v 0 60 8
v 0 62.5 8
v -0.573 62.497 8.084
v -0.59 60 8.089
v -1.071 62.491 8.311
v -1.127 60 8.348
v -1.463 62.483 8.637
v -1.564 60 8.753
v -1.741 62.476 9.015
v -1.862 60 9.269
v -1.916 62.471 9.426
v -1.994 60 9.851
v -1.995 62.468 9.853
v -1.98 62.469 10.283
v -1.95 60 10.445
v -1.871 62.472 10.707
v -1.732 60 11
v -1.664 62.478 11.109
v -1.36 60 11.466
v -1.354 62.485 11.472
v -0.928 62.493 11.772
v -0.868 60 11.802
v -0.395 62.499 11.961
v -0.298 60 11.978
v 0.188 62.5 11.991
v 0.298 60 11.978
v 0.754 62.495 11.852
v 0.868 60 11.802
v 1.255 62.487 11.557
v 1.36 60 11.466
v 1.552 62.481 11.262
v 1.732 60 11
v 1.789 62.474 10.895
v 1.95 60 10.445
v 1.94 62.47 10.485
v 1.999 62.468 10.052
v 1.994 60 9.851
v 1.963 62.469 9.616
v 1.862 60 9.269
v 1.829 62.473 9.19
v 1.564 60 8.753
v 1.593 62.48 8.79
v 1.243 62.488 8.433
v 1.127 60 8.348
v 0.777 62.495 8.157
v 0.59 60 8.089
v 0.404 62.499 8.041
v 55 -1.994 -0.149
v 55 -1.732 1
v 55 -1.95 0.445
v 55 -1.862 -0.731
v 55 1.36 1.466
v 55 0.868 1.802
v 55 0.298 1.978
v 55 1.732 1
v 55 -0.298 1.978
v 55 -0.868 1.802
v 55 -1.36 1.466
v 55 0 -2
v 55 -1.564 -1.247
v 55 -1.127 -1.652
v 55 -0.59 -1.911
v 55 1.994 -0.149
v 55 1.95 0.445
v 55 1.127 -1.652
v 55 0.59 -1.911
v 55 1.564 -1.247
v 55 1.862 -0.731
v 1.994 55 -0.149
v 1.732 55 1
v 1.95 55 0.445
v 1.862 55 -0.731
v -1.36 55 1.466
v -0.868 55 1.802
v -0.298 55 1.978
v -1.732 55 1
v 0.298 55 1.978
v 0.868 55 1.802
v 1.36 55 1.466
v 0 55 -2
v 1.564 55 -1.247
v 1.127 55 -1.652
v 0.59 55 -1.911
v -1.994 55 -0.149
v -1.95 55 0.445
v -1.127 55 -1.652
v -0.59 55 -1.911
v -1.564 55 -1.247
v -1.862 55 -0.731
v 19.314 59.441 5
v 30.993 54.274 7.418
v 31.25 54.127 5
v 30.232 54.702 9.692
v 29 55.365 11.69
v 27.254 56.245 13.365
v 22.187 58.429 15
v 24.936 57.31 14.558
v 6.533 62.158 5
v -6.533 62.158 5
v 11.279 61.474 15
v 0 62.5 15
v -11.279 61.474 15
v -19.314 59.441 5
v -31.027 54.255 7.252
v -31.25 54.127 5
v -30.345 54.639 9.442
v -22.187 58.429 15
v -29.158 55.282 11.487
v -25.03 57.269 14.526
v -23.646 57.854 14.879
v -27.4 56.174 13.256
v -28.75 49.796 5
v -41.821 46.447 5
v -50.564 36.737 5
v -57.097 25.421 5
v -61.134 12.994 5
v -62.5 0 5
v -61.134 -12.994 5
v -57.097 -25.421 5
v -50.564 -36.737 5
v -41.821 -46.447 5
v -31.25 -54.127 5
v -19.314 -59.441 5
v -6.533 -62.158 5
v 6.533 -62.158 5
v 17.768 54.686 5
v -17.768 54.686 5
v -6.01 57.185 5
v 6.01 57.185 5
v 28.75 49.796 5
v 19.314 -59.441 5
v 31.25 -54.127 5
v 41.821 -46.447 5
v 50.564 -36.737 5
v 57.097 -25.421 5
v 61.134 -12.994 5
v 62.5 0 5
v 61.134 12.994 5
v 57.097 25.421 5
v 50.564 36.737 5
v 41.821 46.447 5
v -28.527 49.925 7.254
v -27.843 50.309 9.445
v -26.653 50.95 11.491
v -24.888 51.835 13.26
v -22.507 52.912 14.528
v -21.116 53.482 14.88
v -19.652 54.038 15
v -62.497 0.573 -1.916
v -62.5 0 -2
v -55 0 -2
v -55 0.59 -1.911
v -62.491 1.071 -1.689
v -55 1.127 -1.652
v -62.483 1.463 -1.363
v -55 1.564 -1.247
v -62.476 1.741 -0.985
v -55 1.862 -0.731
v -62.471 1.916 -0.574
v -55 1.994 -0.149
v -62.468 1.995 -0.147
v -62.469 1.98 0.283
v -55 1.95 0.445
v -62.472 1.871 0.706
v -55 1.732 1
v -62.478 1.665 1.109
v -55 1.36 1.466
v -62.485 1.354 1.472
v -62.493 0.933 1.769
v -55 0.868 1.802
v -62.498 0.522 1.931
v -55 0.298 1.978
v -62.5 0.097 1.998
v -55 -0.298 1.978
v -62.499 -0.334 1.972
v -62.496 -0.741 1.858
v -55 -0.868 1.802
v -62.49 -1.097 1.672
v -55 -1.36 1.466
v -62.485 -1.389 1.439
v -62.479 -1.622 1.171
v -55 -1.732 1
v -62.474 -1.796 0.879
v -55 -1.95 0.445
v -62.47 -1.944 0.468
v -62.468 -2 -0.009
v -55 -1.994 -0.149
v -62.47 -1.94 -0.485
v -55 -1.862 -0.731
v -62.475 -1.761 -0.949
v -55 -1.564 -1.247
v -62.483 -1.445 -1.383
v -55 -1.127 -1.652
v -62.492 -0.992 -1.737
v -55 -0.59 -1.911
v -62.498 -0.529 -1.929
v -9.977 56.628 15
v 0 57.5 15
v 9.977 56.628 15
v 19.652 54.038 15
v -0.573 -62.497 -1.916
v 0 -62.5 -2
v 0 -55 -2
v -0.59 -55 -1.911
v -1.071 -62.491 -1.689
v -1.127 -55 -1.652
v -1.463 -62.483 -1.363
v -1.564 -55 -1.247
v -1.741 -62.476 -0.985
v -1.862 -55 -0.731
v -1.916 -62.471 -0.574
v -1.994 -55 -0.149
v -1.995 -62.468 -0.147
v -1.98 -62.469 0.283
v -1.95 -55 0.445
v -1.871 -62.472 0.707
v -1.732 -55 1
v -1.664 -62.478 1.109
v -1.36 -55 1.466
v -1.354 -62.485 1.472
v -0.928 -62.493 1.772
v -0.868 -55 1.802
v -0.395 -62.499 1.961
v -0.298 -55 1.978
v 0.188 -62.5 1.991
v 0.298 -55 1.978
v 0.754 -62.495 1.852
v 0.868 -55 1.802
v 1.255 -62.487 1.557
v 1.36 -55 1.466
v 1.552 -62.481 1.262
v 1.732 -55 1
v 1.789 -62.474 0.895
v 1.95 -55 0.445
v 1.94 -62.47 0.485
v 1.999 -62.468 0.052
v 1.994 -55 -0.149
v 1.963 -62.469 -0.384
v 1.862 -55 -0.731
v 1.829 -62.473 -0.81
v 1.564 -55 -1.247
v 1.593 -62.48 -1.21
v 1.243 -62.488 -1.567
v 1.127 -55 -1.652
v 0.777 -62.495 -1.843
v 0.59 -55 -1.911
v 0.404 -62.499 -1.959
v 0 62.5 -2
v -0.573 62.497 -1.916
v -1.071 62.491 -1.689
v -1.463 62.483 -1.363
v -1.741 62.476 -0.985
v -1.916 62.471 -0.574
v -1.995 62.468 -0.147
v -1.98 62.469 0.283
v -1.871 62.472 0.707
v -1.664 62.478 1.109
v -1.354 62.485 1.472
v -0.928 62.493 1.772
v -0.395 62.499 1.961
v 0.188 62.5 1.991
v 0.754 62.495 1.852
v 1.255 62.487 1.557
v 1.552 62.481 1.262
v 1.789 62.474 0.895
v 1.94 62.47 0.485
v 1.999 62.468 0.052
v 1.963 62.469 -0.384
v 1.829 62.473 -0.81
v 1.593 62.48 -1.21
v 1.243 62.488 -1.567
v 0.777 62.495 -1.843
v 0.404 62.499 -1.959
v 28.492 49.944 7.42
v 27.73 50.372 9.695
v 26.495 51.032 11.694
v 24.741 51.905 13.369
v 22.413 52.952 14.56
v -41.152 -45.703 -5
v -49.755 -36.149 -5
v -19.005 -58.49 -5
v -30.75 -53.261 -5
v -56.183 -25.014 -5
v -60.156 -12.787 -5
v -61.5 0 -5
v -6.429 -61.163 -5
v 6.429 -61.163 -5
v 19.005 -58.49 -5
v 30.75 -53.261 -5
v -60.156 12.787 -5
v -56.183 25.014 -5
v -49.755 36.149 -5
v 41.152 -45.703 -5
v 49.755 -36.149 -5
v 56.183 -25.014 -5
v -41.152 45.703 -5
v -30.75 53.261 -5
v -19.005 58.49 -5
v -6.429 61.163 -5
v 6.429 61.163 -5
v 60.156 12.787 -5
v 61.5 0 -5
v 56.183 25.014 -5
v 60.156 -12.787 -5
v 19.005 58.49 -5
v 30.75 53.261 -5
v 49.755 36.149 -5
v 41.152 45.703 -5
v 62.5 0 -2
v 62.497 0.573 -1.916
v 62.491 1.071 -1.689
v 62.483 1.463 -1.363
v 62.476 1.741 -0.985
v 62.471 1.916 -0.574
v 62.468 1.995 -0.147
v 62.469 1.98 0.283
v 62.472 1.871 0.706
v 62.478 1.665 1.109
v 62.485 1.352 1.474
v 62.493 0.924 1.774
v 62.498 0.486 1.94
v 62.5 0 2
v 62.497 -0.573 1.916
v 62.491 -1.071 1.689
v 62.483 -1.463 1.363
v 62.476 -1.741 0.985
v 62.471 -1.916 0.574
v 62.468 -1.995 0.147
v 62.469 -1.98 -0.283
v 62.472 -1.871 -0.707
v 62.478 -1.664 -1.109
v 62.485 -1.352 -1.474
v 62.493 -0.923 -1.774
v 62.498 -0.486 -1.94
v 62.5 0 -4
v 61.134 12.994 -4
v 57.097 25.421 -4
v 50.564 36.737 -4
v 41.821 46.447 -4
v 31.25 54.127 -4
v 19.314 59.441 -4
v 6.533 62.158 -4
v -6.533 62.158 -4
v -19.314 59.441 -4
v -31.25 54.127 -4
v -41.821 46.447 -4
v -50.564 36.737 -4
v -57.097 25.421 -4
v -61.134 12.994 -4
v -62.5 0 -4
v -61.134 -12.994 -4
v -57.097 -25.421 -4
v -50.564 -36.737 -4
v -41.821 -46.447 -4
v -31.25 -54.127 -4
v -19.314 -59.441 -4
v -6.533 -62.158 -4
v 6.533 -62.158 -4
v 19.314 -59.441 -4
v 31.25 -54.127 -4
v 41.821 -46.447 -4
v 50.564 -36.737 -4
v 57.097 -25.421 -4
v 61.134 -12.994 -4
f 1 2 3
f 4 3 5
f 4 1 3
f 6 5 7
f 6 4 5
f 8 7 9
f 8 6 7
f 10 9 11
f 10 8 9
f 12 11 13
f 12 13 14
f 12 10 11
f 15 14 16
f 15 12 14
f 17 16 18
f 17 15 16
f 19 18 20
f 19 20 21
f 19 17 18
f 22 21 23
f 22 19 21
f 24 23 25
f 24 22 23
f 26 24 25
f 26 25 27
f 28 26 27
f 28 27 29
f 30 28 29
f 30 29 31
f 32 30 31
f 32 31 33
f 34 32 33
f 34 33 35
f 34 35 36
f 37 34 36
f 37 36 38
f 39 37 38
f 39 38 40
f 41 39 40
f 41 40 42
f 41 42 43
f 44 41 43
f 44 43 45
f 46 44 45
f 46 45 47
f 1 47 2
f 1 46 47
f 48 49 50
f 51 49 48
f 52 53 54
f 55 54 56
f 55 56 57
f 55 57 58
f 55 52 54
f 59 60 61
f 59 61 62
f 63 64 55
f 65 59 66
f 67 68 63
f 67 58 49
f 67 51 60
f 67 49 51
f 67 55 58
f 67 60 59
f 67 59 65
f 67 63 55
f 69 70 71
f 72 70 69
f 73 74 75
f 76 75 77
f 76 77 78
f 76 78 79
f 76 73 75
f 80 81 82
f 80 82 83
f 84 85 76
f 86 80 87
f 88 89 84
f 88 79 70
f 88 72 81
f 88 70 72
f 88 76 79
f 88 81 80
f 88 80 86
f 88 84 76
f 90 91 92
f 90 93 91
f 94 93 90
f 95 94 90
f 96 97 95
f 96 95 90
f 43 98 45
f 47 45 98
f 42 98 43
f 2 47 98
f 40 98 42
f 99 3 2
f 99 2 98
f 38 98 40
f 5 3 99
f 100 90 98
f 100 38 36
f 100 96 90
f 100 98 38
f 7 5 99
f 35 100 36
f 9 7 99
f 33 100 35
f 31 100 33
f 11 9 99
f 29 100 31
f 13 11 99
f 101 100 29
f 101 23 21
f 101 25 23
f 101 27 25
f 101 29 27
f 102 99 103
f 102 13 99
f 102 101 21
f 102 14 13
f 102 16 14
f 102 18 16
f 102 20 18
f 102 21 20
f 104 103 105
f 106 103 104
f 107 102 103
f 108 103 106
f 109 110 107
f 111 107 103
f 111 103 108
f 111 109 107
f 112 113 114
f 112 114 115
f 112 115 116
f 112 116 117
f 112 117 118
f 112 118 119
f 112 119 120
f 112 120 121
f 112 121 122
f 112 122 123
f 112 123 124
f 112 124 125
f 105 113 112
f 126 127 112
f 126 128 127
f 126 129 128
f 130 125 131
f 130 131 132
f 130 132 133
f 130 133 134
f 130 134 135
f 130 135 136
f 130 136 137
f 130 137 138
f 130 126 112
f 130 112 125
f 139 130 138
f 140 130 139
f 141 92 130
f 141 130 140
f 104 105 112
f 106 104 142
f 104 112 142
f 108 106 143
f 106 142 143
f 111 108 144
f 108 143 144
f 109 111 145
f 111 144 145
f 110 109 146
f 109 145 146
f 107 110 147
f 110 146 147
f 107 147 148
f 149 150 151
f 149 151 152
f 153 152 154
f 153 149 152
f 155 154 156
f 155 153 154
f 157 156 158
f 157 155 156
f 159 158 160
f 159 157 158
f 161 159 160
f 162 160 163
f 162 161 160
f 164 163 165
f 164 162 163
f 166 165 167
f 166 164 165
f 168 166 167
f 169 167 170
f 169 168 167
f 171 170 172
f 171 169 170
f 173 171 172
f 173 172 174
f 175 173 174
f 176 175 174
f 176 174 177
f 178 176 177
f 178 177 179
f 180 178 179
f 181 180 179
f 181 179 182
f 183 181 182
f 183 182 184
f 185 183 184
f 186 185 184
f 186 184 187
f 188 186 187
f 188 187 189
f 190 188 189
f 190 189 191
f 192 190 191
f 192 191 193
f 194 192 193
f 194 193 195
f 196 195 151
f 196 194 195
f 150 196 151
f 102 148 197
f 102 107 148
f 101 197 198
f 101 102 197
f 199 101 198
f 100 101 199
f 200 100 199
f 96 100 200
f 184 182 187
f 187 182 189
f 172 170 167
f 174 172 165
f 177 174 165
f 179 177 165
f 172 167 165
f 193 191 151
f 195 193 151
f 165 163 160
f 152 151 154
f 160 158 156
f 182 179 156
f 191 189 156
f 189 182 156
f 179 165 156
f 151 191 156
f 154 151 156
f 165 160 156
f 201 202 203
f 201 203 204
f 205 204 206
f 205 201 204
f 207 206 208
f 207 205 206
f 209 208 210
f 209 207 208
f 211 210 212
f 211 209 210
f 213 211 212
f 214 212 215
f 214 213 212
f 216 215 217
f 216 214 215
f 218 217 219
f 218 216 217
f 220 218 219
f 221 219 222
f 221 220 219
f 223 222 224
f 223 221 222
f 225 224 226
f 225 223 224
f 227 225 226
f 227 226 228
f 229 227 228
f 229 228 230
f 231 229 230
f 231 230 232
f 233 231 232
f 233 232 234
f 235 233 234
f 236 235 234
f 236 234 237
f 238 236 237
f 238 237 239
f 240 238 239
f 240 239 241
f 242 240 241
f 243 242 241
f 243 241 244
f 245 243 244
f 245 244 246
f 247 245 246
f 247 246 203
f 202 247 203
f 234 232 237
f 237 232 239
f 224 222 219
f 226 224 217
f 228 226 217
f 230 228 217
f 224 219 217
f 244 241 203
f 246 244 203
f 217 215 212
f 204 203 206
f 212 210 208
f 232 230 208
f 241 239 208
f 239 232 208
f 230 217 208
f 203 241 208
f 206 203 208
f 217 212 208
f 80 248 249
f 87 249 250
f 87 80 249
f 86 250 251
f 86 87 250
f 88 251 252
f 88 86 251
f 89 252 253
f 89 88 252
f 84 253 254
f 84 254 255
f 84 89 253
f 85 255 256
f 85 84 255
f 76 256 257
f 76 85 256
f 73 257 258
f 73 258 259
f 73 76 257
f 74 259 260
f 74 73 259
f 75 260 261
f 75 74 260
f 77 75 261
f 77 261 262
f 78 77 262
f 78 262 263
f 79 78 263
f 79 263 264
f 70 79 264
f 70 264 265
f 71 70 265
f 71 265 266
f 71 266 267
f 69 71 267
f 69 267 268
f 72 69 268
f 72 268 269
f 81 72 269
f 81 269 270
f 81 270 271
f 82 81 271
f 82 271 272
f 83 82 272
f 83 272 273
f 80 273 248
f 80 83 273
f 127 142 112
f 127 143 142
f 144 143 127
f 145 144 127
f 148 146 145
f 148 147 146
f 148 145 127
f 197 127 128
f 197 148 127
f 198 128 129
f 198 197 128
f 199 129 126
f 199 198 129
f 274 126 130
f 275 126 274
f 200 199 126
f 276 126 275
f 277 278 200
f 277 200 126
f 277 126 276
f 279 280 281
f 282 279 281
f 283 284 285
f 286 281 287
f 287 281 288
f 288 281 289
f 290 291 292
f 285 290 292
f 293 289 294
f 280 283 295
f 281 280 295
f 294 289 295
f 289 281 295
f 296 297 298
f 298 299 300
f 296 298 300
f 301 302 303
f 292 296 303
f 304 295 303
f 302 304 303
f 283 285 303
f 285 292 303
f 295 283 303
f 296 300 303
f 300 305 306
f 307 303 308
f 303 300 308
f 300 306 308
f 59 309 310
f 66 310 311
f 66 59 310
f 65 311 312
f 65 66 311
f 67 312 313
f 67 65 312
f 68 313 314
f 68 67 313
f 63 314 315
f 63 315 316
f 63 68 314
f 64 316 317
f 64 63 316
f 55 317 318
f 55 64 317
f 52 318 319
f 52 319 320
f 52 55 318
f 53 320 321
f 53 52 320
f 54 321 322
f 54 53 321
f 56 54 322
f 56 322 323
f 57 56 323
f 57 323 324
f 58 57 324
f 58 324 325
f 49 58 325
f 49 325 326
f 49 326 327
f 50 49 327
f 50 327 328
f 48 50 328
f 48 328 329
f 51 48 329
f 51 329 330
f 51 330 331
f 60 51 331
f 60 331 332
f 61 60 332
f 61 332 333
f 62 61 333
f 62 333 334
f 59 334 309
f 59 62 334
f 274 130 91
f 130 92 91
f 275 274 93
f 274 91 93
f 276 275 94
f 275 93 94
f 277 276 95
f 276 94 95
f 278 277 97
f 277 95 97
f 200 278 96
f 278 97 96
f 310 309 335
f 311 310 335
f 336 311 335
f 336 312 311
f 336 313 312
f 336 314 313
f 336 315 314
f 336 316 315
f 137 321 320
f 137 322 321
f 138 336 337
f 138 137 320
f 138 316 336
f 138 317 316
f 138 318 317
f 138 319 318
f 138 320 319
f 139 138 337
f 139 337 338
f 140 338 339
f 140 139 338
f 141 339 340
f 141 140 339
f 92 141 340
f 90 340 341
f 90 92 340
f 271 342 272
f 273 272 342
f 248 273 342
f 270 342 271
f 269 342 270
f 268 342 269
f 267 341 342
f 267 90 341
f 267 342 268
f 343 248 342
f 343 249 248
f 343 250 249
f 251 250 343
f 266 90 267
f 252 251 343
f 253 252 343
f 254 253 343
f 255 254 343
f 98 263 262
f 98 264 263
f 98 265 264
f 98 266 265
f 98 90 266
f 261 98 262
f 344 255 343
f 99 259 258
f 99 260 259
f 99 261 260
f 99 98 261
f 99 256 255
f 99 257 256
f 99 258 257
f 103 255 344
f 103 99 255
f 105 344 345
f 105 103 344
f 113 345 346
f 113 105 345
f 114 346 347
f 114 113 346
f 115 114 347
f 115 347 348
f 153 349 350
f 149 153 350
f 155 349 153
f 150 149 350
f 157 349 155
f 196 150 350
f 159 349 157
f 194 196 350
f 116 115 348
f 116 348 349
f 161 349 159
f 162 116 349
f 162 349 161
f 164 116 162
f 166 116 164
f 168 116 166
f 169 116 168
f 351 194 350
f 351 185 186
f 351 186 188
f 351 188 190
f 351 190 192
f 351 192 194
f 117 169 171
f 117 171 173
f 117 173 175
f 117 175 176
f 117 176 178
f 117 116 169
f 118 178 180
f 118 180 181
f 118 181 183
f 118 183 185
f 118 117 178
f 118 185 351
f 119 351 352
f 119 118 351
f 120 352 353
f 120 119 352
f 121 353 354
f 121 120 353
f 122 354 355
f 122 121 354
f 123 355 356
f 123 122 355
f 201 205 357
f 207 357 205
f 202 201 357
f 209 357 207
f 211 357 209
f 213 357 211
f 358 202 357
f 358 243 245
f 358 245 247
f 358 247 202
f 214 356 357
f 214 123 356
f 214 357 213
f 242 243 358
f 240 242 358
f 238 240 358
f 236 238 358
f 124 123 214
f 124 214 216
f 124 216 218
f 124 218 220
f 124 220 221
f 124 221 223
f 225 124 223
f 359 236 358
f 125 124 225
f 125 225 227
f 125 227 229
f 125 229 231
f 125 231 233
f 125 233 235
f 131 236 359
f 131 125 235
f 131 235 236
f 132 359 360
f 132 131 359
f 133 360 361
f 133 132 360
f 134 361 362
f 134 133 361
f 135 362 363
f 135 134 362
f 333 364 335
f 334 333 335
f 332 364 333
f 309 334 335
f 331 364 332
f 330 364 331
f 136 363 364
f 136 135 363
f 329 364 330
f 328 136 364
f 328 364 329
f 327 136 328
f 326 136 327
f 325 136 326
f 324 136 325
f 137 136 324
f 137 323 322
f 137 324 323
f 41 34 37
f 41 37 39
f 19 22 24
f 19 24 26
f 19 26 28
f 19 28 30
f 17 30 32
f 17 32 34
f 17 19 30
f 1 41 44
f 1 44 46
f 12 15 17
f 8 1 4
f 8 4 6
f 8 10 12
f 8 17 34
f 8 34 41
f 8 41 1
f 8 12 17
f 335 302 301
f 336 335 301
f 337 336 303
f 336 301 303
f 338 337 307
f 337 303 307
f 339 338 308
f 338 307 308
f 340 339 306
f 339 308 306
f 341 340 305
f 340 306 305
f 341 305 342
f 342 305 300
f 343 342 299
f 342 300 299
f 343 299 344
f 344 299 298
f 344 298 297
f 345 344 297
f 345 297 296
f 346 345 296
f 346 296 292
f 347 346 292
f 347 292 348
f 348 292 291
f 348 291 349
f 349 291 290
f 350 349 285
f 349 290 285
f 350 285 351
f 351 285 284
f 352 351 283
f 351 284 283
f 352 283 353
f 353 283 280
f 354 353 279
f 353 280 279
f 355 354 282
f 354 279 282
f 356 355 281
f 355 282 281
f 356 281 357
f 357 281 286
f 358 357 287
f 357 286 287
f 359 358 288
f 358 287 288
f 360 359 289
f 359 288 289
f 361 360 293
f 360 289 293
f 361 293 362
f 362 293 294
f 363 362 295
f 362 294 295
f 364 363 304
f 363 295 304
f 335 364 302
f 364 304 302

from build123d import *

# Parameters (mm, degrees)
SKETCH1_R           = 62.5
BOSS_EXTRUDE1_DEPTH = 5
CUT_EXTRUDE1_START  = 55
SKETCH2_R           = 2
CUT_EXTRUDE1_DEPTH  = 10
CUT_EXTRUDE2_START  = -65
SKETCH2_2_R         = 2
CUT_EXTRUDE2_DEPTH  = 10
CUT_EXTRUDE3_START  = 55
SKETCH3_R           = 2
CUT_EXTRUDE3_DEPTH  = 10
CUT_EXTRUDE4_START  = -65
SKETCH3_2_R         = 2
CUT_EXTRUDE4_DEPTH  = 10
BOSS_EXTRUDE2_START = 10
BOSS_EXTRUDE2_DEPTH = 10
FILLET1_R           = 10
CUT_EXTRUDE5_START  = 60
SKETCH6_R           = 2
CUT_EXTRUDE5_DEPTH  = 10
CHAMFER1_SIZE       = 1


with BuildPart() as part:
    # Sketch1 → Boss-Extrude1 (new, symmetric)
    with BuildSketch(Plane.XY):
        Circle(SKETCH1_R)
    extrude(amount=BOSS_EXTRUDE1_DEPTH, both=True)

    # Sketch2 → Cut-Extrude1 (cut)
    with BuildSketch(Plane(origin=(0, 0, 0), x_dir=(1, 0, 0), z_dir=(0, 1, 0)).offset(CUT_EXTRUDE1_START)):
        with Locations(Location((0, 0, 0), (0, 0, 90))):
            Circle(SKETCH2_R)
    extrude(amount=CUT_EXTRUDE1_DEPTH, mode=Mode.SUBTRACT)

    # Sketch2<2> → Cut-Extrude2 (cut)
    with BuildSketch(Plane(origin=(0, 0, 0), x_dir=(1, 0, 0), z_dir=(0, 1, 0)).offset(CUT_EXTRUDE2_START)):
        with Locations(Location((0, 0, 0), (0, 0, 90))):
            Circle(SKETCH2_2_R)
    extrude(amount=CUT_EXTRUDE2_DEPTH, mode=Mode.SUBTRACT)

    # Sketch3 → Cut-Extrude3 (cut)
    with BuildSketch(Plane(origin=(0, 0, 0), x_dir=(0, 0, -1), z_dir=(1, 0, 0)).offset(CUT_EXTRUDE3_START)):
        Circle(SKETCH3_R)
    extrude(amount=CUT_EXTRUDE3_DEPTH, mode=Mode.SUBTRACT)

    # Sketch3<2> → Cut-Extrude4 (cut)
    with BuildSketch(Plane(origin=(0, 0, 0), x_dir=(0, 0, -1), z_dir=(1, 0, 0)).offset(CUT_EXTRUDE4_START)):
        Circle(SKETCH3_2_R)
    extrude(amount=CUT_EXTRUDE4_DEPTH, mode=Mode.SUBTRACT)

    # Sketch4 → Boss-Extrude2 (add)
    with BuildSketch(Plane.XY.offset(5).offset(BOSS_EXTRUDE2_START)):
        with BuildLine():
            Line((-31.25, 54.126587737), (-28.75, 49.796460718))
            ThreePointArc((-28.75, 49.796460718), (0, 57.5), (28.75, 49.796460718))
            Line((28.75, 49.796460718), (31.25, 54.126587737))
            ThreePointArc((31.25, 54.126587737), (0, 62.5), (-31.25, 54.126587737))
        make_face()
    extrude(amount=-BOSS_EXTRUDE2_DEPTH)

    # Fillet1
    fillet1_edges = [part.edges().sort_by_distance(p)[0] for p in [
        (-30, 51.961524227, 15),
        (30, 51.961524227, 15),
    ]]
    fillet(fillet1_edges, radius=FILLET1_R - 0.0001)  # a hair under: the kernel refuses the full size

    # Sketch6 → Cut-Extrude5 (cut)
    with BuildSketch(Plane(origin=(0, 0, 0), x_dir=(1, 0, 0), z_dir=(0, 1, 0)).offset(CUT_EXTRUDE5_START)):
        with Locations(Location((0, -10, 0), (0, 0, 90))):
            Circle(SKETCH6_R)
    extrude(amount=CUT_EXTRUDE5_DEPTH, mode=Mode.SUBTRACT)

    # Chamfer1
    chamfer1_edges = [part.edges().sort_by_distance(p)[0] for p in [
        (-62.5, 0, -5),
    ]]
    chamfer(chamfer1_edges, length=CHAMFER1_SIZE)


solid = part.part
